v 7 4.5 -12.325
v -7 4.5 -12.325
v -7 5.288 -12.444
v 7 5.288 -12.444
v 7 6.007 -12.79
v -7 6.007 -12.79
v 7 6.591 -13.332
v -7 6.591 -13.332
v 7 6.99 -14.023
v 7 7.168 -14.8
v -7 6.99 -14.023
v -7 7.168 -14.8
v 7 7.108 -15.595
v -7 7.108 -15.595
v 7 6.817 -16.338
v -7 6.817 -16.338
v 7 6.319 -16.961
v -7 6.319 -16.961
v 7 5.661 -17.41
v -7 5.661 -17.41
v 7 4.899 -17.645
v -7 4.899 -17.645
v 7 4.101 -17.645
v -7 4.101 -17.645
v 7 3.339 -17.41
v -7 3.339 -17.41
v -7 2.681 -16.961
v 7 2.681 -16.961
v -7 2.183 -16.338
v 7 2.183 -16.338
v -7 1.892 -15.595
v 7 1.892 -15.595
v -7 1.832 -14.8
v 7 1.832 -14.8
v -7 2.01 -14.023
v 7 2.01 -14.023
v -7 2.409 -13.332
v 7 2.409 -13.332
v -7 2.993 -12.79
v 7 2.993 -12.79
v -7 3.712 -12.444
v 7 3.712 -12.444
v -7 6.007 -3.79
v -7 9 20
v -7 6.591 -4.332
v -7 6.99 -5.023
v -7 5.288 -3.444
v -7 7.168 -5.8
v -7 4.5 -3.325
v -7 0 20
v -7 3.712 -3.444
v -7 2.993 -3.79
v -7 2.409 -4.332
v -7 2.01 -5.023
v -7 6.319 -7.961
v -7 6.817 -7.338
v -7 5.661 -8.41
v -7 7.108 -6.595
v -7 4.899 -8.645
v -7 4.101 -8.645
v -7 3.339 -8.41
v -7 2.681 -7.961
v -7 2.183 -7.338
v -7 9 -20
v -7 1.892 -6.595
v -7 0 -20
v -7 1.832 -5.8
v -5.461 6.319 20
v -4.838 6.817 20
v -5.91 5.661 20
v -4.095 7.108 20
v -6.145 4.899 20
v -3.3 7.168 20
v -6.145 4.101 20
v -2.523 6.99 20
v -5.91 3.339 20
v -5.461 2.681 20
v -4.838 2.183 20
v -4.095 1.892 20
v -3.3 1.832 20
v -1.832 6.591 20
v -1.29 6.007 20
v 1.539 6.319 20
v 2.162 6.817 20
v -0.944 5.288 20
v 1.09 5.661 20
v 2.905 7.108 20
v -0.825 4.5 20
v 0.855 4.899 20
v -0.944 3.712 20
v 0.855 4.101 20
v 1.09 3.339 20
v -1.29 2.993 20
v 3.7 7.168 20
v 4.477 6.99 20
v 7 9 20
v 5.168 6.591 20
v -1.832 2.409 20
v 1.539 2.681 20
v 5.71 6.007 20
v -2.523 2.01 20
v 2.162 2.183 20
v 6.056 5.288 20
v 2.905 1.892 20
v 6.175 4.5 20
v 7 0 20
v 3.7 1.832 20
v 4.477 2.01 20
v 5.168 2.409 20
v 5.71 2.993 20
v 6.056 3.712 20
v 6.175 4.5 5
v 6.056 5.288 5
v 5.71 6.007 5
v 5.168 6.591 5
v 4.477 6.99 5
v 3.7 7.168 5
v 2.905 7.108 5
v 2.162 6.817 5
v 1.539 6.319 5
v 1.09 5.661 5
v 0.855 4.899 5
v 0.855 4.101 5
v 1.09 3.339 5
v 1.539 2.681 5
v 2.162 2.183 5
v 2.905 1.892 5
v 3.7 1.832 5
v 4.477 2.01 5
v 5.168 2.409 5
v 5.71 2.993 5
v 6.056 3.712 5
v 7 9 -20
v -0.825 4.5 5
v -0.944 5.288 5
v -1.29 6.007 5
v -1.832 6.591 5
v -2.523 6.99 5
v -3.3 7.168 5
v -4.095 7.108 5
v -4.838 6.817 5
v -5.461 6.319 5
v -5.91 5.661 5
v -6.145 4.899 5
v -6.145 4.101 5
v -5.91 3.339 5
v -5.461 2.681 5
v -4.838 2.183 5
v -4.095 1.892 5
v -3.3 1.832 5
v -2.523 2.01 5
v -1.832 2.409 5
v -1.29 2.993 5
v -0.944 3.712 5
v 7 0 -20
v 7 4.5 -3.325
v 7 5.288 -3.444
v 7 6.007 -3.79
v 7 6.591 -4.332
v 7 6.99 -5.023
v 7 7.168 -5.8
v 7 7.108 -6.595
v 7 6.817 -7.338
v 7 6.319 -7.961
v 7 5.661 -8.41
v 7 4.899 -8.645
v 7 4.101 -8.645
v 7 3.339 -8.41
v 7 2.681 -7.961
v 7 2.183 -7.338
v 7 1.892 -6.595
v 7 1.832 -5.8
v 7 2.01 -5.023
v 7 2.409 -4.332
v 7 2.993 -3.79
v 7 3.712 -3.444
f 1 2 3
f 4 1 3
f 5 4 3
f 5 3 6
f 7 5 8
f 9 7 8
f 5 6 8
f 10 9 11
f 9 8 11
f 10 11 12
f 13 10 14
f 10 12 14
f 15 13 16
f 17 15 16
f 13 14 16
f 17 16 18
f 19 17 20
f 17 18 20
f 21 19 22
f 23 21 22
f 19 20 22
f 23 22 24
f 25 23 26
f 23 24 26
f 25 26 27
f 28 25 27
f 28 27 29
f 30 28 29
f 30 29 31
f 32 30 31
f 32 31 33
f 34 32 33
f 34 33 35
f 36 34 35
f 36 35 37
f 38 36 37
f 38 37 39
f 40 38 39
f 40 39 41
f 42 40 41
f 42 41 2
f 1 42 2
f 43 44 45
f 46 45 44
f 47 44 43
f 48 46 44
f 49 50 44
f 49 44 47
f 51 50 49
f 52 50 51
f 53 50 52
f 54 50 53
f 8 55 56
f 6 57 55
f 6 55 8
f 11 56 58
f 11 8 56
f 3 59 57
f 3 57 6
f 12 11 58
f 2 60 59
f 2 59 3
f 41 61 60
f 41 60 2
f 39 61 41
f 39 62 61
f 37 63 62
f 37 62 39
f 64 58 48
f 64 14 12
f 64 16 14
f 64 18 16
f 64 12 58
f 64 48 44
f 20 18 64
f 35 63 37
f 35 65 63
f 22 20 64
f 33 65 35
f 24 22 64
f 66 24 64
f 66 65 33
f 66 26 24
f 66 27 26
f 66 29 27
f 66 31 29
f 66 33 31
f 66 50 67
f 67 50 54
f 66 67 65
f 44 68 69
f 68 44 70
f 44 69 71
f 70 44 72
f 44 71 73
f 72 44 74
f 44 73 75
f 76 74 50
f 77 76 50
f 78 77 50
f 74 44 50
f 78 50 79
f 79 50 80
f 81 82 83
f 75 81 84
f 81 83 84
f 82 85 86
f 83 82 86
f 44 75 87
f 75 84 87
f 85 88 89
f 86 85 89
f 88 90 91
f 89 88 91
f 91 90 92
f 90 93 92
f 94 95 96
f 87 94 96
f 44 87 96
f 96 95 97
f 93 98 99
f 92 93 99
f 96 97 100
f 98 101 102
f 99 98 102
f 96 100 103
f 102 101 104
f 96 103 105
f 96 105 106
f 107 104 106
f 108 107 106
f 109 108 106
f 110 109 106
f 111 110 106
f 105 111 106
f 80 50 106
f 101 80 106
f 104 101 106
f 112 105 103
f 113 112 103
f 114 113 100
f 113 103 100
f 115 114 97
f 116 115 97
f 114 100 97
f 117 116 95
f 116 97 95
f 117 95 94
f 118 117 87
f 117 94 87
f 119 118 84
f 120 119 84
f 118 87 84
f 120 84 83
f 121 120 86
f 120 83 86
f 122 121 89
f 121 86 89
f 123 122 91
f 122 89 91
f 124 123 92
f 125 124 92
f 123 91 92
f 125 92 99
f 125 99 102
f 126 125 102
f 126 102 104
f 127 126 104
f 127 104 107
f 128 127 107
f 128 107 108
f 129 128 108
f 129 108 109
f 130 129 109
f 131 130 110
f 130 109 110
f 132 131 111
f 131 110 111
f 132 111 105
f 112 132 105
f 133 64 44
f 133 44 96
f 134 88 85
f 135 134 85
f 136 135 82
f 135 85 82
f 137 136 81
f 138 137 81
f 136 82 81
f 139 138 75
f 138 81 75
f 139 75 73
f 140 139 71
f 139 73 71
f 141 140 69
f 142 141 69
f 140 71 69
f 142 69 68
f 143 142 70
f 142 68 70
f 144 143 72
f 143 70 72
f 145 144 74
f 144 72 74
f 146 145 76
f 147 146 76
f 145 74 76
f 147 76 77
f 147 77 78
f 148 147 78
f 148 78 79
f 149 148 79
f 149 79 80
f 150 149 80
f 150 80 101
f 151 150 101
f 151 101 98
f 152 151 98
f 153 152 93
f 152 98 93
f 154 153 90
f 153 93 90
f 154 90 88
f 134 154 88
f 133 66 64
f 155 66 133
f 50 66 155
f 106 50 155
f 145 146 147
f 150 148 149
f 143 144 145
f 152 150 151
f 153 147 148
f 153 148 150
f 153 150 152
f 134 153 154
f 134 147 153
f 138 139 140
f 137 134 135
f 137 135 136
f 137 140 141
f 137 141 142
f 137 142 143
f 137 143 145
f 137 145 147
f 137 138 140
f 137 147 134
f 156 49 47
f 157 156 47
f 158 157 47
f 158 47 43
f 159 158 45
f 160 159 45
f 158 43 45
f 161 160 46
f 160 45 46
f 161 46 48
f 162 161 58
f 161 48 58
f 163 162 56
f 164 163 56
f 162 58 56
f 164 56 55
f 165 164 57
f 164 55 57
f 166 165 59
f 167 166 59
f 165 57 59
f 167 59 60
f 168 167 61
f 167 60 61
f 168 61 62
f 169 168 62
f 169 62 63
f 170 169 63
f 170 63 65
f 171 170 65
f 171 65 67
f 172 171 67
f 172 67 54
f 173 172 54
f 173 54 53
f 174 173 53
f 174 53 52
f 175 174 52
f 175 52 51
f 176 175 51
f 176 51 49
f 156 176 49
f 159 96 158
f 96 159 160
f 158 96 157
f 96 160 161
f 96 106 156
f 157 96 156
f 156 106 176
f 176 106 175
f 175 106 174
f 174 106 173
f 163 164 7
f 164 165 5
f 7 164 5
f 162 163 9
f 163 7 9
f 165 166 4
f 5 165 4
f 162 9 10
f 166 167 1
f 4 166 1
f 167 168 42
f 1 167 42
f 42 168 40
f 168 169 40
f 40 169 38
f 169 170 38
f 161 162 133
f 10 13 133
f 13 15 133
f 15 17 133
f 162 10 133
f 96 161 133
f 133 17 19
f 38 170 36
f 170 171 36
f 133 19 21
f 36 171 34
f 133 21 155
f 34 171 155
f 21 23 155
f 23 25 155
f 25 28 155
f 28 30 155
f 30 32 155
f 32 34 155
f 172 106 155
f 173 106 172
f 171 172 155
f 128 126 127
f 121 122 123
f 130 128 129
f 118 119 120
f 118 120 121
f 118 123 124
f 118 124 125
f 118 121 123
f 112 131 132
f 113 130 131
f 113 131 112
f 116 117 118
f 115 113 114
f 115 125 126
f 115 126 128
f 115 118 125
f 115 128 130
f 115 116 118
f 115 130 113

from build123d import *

# Parameters (mm, degrees)
CROQUIS1_W              = 14
CROQUIS1_H              = 40
SALIENTE_EXTRUIR1_DEPTH = 9
CROQUIS3_R              = 2.675
CORTAR_EXTRUIR2_DEPTH   = 15
CROQUIS4_R              = 2.675
CORTAR_EXTRUIR3_DEPTH   = 15


with BuildPart() as part:
    # Croquis1 → Saliente-Extruir1 (new body)
    with BuildSketch(Plane(origin=(0, 0, 0), x_dir=(1, 0, 0), z_dir=(0, 1, 0))):
        Rectangle(CROQUIS1_W, CROQUIS1_H)
    extrude(amount=SALIENTE_EXTRUIR1_DEPTH)

    # Croquis3 → Cortar-Extruir2 (cut)
    with BuildSketch(Plane.XY.offset(20)):
        with Locations((-3.5, 4.5)):
            Circle(CROQUIS3_R)
        with Locations((3.5, 4.5)):
            Circle(CROQUIS3_R)
    extrude(amount=-CORTAR_EXTRUIR2_DEPTH, mode=Mode.SUBTRACT)

    # Croquis4 → Cortar-Extruir3 (cut, through all)
    with BuildSketch(Plane.ZY.offset(7)):
        with Locations((-15, 4.5)):
            Circle(CROQUIS4_R)
        with Locations((-6, 4.5)):
            Circle(CROQUIS4_R)
    extrude(amount=-CORTAR_EXTRUIR3_DEPTH, mode=Mode.SUBTRACT)


solid = part.part
